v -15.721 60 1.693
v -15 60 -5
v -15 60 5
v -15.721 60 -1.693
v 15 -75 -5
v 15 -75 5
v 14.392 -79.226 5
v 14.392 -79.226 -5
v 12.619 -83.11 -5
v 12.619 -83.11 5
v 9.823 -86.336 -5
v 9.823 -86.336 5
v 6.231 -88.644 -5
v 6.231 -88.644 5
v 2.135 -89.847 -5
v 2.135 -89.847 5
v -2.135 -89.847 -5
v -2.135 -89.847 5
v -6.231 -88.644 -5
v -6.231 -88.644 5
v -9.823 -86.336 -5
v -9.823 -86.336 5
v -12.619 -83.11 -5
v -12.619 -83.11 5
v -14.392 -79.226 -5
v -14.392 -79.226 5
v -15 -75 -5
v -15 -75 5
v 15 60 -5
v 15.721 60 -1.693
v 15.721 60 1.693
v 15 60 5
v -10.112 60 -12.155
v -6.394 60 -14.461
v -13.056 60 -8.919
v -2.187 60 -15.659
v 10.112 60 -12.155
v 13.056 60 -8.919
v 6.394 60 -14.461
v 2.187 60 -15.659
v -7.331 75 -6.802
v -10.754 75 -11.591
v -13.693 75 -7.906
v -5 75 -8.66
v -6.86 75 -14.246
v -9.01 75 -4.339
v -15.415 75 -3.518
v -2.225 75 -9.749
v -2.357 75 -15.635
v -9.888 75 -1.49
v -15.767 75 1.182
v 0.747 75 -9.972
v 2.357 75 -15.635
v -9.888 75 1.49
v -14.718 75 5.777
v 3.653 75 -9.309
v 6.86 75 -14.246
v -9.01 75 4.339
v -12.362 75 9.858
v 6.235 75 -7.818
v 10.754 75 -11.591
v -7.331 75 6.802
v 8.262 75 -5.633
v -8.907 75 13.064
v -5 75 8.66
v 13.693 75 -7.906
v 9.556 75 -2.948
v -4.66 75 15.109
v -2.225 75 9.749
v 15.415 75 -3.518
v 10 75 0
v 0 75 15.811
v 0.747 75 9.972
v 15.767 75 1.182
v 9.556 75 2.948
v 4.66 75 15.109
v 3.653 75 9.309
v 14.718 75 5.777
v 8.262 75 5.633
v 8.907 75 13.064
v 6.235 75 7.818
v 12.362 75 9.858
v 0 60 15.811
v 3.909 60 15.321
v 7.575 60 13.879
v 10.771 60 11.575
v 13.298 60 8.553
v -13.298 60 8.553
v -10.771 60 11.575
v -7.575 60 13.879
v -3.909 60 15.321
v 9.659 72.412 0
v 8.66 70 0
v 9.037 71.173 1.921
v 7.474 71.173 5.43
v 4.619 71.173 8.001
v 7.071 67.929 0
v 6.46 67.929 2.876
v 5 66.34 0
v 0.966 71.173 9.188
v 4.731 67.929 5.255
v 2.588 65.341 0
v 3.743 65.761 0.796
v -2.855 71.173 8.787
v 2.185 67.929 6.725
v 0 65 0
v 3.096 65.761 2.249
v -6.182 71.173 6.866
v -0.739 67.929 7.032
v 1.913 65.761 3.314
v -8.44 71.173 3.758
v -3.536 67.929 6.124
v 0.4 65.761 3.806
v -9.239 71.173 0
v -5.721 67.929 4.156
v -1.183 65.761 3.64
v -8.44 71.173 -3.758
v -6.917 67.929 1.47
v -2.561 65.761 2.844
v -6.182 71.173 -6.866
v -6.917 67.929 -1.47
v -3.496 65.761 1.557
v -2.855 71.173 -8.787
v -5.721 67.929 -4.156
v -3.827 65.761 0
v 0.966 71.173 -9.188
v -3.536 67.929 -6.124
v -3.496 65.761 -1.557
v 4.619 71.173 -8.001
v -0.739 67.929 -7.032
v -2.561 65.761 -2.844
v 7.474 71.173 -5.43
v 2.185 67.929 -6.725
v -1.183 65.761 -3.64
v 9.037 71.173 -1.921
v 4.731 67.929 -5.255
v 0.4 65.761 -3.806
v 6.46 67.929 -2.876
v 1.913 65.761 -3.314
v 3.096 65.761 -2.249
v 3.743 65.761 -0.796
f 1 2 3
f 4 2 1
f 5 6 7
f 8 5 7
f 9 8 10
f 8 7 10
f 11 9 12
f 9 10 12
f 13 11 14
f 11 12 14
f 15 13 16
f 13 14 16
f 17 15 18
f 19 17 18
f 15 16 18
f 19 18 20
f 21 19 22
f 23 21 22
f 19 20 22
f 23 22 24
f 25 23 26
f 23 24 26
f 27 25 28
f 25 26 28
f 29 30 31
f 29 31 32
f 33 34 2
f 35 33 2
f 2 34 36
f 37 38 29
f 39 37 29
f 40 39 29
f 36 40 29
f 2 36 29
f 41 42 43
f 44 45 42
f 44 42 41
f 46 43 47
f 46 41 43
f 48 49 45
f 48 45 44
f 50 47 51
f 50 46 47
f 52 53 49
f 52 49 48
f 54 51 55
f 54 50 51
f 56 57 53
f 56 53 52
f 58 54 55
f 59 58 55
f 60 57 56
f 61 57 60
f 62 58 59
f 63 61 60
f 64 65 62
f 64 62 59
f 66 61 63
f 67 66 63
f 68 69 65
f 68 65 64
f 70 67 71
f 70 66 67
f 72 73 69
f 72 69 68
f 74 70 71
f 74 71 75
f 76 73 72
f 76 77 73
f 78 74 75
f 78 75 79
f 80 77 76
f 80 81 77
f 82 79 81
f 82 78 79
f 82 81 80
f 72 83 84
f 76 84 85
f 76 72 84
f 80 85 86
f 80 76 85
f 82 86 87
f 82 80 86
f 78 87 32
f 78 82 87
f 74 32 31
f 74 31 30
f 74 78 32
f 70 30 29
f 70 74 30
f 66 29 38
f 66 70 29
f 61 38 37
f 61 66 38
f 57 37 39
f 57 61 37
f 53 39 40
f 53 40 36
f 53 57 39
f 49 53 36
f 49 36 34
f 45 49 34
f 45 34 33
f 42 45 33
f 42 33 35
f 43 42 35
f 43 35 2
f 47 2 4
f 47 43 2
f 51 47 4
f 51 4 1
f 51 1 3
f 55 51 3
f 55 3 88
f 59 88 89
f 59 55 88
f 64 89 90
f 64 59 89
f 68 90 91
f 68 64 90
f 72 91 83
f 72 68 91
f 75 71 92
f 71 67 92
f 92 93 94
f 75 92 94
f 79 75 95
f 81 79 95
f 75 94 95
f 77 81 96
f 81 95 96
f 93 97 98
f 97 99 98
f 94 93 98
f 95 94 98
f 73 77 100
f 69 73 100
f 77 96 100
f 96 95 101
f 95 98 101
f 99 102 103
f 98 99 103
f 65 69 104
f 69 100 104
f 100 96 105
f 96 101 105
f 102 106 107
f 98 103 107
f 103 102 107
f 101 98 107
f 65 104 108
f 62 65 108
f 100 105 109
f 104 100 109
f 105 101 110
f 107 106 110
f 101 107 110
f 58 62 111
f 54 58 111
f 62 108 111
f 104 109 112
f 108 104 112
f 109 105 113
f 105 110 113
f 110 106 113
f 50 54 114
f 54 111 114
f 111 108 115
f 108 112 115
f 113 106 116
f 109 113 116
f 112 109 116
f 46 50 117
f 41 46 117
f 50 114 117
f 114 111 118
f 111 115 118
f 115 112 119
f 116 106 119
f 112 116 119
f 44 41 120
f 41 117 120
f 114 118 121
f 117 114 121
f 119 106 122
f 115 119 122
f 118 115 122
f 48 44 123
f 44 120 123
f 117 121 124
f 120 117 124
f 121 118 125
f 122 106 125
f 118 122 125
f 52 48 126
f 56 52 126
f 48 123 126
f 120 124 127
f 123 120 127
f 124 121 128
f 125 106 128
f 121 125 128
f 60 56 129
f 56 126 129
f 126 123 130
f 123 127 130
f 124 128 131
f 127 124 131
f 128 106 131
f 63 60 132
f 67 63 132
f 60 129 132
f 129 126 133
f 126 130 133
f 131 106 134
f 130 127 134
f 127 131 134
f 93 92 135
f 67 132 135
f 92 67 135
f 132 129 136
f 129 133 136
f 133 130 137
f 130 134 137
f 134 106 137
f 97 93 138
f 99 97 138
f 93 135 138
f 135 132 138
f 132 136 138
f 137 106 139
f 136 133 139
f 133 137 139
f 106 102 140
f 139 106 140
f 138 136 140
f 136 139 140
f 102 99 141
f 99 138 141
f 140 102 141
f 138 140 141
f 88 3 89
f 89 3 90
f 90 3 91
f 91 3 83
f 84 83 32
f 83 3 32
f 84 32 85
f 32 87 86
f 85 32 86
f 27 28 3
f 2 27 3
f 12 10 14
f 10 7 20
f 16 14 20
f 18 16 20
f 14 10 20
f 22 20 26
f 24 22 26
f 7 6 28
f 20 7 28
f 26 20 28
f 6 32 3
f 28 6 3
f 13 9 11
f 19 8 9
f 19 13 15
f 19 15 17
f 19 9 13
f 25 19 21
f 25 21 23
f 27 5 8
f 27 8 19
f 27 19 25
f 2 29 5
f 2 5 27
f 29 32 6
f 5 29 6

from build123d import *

# Parameters (mm, degrees)
BOSS_EXTRUDE1_DEPTH = 5
SKETCH4_R           = 15.811388301
BOSS_EXTRUDE2_DEPTH = 15


with BuildPart() as part:
    # Sketch1 → Boss-Extrude1 (new, symmetric)
    with BuildSketch(Plane.XY):
        with BuildLine():
            Line((-15, -75), (-15, 75))
            Line((-15, 75), (15, 75))
            Line((15, 75), (15, -75))
            ThreePointArc((15, -75), (0, -90), (-15, -75))
        make_face()
    extrude(amount=BOSS_EXTRUDE1_DEPTH, both=True)

    # Sketch4 → Boss-Extrude2 (add)
    with BuildSketch(Plane(origin=(0, 75, 0), x_dir=(1, 0, 0), z_dir=(0, 1, 0))):
        with Locations(Location((0, 0, 0), (0, 0, 270))):
            Circle(SKETCH4_R)
    extrude(amount=-BOSS_EXTRUDE2_DEPTH)

    # Sketch6 → Cut-Revolve3 (revolve, cut)
    with BuildSketch(Plane.XY):
        with BuildLine():
            Line((0, 75), (10, 75))
            ThreePointArc((10, 75), (7.071067812, 67.928932188), (0, 65))
            Line((0, 65), (0, 75))
        make_face()
    revolve(axis=Axis((0, 75, 0), (0, -1, 0)), mode=Mode.SUBTRACT)


solid = part.part
